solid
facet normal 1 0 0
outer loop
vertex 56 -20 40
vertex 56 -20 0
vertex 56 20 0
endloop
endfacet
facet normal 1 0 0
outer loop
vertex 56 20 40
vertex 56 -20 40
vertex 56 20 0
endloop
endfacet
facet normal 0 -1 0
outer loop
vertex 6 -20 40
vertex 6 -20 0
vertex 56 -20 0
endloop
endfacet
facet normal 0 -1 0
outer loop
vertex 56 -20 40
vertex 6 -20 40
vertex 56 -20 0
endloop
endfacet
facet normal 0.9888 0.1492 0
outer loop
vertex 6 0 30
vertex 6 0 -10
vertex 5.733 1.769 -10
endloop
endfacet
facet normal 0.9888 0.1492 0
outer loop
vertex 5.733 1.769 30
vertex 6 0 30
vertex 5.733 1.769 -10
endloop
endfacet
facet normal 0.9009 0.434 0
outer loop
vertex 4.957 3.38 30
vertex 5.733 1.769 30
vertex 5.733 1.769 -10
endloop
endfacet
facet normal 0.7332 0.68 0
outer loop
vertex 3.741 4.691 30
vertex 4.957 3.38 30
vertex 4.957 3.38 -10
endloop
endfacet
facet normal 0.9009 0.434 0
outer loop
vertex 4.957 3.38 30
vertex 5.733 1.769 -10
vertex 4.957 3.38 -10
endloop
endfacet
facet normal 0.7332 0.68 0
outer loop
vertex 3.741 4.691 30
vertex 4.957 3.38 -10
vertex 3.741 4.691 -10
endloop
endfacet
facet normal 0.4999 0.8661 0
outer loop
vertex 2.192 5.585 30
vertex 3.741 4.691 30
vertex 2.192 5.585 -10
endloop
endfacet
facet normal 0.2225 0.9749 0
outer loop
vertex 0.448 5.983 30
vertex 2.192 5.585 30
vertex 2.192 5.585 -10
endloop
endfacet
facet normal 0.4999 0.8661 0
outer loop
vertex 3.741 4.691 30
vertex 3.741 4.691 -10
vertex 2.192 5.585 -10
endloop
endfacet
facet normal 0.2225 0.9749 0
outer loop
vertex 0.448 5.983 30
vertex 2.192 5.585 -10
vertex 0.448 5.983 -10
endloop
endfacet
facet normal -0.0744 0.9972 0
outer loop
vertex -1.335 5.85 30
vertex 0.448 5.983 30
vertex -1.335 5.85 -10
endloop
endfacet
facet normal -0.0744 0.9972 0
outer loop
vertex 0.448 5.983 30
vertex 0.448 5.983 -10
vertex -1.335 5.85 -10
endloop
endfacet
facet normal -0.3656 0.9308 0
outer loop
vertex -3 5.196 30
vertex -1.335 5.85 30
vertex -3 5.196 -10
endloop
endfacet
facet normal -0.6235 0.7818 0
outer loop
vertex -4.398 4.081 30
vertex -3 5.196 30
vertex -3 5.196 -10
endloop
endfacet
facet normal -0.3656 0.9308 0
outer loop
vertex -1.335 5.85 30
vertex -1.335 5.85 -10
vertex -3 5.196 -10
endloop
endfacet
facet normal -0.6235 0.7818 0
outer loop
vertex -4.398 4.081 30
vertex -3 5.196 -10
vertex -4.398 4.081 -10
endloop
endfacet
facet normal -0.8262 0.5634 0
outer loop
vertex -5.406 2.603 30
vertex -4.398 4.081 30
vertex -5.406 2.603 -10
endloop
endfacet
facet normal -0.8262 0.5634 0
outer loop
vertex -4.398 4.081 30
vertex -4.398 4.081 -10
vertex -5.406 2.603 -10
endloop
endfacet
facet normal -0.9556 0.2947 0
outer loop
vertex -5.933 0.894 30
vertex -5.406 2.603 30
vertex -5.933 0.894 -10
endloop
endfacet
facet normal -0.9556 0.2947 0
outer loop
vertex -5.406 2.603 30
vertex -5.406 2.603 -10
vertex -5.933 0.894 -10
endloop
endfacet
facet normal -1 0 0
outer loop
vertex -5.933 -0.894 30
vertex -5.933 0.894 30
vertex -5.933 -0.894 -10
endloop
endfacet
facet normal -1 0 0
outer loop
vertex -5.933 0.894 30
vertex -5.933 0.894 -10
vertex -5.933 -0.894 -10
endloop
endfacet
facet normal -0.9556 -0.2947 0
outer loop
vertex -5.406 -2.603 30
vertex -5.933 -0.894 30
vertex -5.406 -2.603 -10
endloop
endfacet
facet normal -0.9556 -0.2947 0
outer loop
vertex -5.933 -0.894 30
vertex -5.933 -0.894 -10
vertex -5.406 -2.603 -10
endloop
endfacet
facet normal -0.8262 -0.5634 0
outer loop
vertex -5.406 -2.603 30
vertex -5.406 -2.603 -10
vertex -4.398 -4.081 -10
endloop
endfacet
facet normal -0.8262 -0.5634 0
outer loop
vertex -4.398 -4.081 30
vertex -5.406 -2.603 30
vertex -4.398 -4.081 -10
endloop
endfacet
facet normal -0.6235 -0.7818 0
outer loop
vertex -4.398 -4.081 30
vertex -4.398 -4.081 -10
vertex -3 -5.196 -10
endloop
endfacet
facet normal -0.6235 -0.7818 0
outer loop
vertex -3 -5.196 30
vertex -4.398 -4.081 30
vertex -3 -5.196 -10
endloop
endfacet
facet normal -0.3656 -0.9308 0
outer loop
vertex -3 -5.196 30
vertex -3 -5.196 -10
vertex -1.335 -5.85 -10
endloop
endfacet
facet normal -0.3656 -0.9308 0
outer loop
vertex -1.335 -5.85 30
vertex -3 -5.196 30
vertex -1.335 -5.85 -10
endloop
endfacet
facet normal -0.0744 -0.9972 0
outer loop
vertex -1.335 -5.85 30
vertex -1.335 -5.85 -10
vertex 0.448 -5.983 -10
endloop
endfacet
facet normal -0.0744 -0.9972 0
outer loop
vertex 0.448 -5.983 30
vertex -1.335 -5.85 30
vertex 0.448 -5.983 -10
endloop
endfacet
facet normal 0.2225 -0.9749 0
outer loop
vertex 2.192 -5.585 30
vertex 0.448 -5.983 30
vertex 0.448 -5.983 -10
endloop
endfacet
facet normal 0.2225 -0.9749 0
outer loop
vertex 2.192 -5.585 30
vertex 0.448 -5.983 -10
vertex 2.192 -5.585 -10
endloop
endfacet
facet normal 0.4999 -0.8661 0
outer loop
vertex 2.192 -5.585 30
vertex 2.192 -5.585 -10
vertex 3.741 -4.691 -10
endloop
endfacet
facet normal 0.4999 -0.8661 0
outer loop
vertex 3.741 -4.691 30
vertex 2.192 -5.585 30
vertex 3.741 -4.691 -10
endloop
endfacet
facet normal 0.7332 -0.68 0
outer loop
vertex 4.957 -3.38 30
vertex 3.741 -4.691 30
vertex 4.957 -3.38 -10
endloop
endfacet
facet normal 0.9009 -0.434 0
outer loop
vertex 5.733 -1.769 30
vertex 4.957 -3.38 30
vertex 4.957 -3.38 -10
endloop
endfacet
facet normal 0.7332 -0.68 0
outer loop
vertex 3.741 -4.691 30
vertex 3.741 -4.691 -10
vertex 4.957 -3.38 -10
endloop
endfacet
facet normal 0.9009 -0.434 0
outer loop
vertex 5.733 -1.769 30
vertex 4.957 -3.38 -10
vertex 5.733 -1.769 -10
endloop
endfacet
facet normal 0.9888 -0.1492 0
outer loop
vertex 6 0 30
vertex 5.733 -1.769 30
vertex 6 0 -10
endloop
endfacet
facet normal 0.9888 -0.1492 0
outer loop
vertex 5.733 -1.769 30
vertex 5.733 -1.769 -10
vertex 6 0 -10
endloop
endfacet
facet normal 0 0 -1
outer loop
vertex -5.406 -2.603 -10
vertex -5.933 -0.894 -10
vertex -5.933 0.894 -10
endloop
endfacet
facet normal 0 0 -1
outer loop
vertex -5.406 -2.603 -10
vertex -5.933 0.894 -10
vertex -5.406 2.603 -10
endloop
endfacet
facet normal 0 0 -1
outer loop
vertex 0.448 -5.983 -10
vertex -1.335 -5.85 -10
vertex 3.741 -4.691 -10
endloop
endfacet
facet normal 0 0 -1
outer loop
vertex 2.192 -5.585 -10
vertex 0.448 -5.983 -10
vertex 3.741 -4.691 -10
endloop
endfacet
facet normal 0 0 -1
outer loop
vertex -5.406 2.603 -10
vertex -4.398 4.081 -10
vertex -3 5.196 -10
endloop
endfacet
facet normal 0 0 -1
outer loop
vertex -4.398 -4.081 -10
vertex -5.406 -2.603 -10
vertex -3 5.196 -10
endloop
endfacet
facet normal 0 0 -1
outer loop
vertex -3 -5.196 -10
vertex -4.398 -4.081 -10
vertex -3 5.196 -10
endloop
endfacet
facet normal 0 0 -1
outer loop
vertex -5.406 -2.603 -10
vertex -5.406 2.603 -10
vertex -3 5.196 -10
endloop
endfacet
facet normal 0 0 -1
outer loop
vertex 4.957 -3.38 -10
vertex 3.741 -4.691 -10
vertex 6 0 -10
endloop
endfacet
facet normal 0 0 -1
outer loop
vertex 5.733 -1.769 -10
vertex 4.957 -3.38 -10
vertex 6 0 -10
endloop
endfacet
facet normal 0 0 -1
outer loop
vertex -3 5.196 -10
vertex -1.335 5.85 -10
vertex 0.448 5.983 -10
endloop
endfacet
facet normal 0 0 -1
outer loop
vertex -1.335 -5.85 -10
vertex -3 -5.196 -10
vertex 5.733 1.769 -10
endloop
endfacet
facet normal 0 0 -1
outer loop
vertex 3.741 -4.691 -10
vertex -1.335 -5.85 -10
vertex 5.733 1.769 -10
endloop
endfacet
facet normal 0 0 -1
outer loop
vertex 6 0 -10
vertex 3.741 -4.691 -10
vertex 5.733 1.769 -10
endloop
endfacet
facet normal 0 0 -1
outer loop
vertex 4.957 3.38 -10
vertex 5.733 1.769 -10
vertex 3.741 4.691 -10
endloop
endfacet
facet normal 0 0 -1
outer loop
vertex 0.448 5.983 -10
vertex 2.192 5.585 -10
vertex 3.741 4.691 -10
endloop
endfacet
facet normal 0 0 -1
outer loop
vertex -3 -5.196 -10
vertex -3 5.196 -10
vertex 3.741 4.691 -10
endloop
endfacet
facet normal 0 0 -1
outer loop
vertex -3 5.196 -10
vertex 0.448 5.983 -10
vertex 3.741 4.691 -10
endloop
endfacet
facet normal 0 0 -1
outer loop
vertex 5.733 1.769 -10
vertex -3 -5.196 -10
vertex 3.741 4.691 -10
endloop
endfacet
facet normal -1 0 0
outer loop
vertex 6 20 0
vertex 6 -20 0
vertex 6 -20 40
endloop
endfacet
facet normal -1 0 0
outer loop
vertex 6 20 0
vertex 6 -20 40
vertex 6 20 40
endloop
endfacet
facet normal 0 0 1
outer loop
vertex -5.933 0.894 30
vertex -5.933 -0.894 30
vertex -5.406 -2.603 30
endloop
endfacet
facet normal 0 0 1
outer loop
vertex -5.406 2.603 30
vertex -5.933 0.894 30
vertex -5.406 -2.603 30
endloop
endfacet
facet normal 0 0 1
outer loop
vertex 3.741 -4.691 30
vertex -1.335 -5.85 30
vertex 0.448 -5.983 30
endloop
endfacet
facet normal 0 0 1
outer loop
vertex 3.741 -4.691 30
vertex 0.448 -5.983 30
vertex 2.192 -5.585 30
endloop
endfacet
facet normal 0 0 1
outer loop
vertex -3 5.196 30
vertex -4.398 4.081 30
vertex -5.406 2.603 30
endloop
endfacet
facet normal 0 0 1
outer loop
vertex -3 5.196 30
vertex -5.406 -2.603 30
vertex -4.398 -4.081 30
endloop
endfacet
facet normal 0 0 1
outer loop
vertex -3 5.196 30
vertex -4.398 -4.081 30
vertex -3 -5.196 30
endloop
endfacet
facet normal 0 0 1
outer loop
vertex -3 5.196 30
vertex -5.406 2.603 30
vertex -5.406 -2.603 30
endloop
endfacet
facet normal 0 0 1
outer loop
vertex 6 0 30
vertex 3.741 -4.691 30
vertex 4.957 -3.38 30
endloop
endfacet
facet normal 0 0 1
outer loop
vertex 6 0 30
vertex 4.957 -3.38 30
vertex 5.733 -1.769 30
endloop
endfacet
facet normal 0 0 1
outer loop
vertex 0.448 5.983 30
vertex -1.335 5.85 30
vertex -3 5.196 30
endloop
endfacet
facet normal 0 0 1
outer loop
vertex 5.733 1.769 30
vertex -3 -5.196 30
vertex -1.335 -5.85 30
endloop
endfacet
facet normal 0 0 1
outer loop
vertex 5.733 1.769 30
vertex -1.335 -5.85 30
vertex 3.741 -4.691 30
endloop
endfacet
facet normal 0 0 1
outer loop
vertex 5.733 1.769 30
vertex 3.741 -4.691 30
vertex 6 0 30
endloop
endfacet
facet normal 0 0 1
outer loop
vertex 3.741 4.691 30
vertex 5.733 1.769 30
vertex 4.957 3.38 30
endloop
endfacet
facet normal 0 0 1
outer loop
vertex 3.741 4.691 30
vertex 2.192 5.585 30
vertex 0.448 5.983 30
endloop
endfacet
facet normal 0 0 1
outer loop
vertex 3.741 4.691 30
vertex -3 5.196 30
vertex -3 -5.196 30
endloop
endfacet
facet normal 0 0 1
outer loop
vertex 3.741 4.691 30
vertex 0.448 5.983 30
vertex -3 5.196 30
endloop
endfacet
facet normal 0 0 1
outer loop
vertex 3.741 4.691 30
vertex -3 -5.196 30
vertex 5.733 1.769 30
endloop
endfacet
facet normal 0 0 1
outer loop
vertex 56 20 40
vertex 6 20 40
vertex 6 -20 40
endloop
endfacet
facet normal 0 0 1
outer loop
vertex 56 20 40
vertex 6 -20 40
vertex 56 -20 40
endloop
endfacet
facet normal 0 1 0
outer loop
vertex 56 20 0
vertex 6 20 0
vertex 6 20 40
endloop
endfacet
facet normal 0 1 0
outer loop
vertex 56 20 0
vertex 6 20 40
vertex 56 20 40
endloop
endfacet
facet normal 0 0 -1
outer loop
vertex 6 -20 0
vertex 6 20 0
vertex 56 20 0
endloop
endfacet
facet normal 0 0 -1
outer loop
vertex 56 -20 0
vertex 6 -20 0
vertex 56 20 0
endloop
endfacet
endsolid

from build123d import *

# Parameters (mm, degrees)
BOSS_EXTRUDE1_DEPTH = 40
BOSS_EXTRUDE2_START = -10
SKETCH1_3_R         = 6
BOSS_EXTRUDE2_DEPTH = 40


with BuildPart() as part:
    # Sketch1 → Boss-Extrude1 (new body)
    with BuildSketch(Plane.XY):
        Polygon((56, 20), (6, 20), (6, 0), (6, -20), (56, -20), align=None)
    extrude(amount=BOSS_EXTRUDE1_DEPTH)


with BuildPart() as body_2:
    # Sketch1<3> → Boss-Extrude2 (new body)
    with BuildSketch(Plane.XY.offset(BOSS_EXTRUDE2_START)):
        Circle(SKETCH1_3_R)
    extrude(amount=BOSS_EXTRUDE2_DEPTH)


solid = Compound([part.part, body_2.part])
